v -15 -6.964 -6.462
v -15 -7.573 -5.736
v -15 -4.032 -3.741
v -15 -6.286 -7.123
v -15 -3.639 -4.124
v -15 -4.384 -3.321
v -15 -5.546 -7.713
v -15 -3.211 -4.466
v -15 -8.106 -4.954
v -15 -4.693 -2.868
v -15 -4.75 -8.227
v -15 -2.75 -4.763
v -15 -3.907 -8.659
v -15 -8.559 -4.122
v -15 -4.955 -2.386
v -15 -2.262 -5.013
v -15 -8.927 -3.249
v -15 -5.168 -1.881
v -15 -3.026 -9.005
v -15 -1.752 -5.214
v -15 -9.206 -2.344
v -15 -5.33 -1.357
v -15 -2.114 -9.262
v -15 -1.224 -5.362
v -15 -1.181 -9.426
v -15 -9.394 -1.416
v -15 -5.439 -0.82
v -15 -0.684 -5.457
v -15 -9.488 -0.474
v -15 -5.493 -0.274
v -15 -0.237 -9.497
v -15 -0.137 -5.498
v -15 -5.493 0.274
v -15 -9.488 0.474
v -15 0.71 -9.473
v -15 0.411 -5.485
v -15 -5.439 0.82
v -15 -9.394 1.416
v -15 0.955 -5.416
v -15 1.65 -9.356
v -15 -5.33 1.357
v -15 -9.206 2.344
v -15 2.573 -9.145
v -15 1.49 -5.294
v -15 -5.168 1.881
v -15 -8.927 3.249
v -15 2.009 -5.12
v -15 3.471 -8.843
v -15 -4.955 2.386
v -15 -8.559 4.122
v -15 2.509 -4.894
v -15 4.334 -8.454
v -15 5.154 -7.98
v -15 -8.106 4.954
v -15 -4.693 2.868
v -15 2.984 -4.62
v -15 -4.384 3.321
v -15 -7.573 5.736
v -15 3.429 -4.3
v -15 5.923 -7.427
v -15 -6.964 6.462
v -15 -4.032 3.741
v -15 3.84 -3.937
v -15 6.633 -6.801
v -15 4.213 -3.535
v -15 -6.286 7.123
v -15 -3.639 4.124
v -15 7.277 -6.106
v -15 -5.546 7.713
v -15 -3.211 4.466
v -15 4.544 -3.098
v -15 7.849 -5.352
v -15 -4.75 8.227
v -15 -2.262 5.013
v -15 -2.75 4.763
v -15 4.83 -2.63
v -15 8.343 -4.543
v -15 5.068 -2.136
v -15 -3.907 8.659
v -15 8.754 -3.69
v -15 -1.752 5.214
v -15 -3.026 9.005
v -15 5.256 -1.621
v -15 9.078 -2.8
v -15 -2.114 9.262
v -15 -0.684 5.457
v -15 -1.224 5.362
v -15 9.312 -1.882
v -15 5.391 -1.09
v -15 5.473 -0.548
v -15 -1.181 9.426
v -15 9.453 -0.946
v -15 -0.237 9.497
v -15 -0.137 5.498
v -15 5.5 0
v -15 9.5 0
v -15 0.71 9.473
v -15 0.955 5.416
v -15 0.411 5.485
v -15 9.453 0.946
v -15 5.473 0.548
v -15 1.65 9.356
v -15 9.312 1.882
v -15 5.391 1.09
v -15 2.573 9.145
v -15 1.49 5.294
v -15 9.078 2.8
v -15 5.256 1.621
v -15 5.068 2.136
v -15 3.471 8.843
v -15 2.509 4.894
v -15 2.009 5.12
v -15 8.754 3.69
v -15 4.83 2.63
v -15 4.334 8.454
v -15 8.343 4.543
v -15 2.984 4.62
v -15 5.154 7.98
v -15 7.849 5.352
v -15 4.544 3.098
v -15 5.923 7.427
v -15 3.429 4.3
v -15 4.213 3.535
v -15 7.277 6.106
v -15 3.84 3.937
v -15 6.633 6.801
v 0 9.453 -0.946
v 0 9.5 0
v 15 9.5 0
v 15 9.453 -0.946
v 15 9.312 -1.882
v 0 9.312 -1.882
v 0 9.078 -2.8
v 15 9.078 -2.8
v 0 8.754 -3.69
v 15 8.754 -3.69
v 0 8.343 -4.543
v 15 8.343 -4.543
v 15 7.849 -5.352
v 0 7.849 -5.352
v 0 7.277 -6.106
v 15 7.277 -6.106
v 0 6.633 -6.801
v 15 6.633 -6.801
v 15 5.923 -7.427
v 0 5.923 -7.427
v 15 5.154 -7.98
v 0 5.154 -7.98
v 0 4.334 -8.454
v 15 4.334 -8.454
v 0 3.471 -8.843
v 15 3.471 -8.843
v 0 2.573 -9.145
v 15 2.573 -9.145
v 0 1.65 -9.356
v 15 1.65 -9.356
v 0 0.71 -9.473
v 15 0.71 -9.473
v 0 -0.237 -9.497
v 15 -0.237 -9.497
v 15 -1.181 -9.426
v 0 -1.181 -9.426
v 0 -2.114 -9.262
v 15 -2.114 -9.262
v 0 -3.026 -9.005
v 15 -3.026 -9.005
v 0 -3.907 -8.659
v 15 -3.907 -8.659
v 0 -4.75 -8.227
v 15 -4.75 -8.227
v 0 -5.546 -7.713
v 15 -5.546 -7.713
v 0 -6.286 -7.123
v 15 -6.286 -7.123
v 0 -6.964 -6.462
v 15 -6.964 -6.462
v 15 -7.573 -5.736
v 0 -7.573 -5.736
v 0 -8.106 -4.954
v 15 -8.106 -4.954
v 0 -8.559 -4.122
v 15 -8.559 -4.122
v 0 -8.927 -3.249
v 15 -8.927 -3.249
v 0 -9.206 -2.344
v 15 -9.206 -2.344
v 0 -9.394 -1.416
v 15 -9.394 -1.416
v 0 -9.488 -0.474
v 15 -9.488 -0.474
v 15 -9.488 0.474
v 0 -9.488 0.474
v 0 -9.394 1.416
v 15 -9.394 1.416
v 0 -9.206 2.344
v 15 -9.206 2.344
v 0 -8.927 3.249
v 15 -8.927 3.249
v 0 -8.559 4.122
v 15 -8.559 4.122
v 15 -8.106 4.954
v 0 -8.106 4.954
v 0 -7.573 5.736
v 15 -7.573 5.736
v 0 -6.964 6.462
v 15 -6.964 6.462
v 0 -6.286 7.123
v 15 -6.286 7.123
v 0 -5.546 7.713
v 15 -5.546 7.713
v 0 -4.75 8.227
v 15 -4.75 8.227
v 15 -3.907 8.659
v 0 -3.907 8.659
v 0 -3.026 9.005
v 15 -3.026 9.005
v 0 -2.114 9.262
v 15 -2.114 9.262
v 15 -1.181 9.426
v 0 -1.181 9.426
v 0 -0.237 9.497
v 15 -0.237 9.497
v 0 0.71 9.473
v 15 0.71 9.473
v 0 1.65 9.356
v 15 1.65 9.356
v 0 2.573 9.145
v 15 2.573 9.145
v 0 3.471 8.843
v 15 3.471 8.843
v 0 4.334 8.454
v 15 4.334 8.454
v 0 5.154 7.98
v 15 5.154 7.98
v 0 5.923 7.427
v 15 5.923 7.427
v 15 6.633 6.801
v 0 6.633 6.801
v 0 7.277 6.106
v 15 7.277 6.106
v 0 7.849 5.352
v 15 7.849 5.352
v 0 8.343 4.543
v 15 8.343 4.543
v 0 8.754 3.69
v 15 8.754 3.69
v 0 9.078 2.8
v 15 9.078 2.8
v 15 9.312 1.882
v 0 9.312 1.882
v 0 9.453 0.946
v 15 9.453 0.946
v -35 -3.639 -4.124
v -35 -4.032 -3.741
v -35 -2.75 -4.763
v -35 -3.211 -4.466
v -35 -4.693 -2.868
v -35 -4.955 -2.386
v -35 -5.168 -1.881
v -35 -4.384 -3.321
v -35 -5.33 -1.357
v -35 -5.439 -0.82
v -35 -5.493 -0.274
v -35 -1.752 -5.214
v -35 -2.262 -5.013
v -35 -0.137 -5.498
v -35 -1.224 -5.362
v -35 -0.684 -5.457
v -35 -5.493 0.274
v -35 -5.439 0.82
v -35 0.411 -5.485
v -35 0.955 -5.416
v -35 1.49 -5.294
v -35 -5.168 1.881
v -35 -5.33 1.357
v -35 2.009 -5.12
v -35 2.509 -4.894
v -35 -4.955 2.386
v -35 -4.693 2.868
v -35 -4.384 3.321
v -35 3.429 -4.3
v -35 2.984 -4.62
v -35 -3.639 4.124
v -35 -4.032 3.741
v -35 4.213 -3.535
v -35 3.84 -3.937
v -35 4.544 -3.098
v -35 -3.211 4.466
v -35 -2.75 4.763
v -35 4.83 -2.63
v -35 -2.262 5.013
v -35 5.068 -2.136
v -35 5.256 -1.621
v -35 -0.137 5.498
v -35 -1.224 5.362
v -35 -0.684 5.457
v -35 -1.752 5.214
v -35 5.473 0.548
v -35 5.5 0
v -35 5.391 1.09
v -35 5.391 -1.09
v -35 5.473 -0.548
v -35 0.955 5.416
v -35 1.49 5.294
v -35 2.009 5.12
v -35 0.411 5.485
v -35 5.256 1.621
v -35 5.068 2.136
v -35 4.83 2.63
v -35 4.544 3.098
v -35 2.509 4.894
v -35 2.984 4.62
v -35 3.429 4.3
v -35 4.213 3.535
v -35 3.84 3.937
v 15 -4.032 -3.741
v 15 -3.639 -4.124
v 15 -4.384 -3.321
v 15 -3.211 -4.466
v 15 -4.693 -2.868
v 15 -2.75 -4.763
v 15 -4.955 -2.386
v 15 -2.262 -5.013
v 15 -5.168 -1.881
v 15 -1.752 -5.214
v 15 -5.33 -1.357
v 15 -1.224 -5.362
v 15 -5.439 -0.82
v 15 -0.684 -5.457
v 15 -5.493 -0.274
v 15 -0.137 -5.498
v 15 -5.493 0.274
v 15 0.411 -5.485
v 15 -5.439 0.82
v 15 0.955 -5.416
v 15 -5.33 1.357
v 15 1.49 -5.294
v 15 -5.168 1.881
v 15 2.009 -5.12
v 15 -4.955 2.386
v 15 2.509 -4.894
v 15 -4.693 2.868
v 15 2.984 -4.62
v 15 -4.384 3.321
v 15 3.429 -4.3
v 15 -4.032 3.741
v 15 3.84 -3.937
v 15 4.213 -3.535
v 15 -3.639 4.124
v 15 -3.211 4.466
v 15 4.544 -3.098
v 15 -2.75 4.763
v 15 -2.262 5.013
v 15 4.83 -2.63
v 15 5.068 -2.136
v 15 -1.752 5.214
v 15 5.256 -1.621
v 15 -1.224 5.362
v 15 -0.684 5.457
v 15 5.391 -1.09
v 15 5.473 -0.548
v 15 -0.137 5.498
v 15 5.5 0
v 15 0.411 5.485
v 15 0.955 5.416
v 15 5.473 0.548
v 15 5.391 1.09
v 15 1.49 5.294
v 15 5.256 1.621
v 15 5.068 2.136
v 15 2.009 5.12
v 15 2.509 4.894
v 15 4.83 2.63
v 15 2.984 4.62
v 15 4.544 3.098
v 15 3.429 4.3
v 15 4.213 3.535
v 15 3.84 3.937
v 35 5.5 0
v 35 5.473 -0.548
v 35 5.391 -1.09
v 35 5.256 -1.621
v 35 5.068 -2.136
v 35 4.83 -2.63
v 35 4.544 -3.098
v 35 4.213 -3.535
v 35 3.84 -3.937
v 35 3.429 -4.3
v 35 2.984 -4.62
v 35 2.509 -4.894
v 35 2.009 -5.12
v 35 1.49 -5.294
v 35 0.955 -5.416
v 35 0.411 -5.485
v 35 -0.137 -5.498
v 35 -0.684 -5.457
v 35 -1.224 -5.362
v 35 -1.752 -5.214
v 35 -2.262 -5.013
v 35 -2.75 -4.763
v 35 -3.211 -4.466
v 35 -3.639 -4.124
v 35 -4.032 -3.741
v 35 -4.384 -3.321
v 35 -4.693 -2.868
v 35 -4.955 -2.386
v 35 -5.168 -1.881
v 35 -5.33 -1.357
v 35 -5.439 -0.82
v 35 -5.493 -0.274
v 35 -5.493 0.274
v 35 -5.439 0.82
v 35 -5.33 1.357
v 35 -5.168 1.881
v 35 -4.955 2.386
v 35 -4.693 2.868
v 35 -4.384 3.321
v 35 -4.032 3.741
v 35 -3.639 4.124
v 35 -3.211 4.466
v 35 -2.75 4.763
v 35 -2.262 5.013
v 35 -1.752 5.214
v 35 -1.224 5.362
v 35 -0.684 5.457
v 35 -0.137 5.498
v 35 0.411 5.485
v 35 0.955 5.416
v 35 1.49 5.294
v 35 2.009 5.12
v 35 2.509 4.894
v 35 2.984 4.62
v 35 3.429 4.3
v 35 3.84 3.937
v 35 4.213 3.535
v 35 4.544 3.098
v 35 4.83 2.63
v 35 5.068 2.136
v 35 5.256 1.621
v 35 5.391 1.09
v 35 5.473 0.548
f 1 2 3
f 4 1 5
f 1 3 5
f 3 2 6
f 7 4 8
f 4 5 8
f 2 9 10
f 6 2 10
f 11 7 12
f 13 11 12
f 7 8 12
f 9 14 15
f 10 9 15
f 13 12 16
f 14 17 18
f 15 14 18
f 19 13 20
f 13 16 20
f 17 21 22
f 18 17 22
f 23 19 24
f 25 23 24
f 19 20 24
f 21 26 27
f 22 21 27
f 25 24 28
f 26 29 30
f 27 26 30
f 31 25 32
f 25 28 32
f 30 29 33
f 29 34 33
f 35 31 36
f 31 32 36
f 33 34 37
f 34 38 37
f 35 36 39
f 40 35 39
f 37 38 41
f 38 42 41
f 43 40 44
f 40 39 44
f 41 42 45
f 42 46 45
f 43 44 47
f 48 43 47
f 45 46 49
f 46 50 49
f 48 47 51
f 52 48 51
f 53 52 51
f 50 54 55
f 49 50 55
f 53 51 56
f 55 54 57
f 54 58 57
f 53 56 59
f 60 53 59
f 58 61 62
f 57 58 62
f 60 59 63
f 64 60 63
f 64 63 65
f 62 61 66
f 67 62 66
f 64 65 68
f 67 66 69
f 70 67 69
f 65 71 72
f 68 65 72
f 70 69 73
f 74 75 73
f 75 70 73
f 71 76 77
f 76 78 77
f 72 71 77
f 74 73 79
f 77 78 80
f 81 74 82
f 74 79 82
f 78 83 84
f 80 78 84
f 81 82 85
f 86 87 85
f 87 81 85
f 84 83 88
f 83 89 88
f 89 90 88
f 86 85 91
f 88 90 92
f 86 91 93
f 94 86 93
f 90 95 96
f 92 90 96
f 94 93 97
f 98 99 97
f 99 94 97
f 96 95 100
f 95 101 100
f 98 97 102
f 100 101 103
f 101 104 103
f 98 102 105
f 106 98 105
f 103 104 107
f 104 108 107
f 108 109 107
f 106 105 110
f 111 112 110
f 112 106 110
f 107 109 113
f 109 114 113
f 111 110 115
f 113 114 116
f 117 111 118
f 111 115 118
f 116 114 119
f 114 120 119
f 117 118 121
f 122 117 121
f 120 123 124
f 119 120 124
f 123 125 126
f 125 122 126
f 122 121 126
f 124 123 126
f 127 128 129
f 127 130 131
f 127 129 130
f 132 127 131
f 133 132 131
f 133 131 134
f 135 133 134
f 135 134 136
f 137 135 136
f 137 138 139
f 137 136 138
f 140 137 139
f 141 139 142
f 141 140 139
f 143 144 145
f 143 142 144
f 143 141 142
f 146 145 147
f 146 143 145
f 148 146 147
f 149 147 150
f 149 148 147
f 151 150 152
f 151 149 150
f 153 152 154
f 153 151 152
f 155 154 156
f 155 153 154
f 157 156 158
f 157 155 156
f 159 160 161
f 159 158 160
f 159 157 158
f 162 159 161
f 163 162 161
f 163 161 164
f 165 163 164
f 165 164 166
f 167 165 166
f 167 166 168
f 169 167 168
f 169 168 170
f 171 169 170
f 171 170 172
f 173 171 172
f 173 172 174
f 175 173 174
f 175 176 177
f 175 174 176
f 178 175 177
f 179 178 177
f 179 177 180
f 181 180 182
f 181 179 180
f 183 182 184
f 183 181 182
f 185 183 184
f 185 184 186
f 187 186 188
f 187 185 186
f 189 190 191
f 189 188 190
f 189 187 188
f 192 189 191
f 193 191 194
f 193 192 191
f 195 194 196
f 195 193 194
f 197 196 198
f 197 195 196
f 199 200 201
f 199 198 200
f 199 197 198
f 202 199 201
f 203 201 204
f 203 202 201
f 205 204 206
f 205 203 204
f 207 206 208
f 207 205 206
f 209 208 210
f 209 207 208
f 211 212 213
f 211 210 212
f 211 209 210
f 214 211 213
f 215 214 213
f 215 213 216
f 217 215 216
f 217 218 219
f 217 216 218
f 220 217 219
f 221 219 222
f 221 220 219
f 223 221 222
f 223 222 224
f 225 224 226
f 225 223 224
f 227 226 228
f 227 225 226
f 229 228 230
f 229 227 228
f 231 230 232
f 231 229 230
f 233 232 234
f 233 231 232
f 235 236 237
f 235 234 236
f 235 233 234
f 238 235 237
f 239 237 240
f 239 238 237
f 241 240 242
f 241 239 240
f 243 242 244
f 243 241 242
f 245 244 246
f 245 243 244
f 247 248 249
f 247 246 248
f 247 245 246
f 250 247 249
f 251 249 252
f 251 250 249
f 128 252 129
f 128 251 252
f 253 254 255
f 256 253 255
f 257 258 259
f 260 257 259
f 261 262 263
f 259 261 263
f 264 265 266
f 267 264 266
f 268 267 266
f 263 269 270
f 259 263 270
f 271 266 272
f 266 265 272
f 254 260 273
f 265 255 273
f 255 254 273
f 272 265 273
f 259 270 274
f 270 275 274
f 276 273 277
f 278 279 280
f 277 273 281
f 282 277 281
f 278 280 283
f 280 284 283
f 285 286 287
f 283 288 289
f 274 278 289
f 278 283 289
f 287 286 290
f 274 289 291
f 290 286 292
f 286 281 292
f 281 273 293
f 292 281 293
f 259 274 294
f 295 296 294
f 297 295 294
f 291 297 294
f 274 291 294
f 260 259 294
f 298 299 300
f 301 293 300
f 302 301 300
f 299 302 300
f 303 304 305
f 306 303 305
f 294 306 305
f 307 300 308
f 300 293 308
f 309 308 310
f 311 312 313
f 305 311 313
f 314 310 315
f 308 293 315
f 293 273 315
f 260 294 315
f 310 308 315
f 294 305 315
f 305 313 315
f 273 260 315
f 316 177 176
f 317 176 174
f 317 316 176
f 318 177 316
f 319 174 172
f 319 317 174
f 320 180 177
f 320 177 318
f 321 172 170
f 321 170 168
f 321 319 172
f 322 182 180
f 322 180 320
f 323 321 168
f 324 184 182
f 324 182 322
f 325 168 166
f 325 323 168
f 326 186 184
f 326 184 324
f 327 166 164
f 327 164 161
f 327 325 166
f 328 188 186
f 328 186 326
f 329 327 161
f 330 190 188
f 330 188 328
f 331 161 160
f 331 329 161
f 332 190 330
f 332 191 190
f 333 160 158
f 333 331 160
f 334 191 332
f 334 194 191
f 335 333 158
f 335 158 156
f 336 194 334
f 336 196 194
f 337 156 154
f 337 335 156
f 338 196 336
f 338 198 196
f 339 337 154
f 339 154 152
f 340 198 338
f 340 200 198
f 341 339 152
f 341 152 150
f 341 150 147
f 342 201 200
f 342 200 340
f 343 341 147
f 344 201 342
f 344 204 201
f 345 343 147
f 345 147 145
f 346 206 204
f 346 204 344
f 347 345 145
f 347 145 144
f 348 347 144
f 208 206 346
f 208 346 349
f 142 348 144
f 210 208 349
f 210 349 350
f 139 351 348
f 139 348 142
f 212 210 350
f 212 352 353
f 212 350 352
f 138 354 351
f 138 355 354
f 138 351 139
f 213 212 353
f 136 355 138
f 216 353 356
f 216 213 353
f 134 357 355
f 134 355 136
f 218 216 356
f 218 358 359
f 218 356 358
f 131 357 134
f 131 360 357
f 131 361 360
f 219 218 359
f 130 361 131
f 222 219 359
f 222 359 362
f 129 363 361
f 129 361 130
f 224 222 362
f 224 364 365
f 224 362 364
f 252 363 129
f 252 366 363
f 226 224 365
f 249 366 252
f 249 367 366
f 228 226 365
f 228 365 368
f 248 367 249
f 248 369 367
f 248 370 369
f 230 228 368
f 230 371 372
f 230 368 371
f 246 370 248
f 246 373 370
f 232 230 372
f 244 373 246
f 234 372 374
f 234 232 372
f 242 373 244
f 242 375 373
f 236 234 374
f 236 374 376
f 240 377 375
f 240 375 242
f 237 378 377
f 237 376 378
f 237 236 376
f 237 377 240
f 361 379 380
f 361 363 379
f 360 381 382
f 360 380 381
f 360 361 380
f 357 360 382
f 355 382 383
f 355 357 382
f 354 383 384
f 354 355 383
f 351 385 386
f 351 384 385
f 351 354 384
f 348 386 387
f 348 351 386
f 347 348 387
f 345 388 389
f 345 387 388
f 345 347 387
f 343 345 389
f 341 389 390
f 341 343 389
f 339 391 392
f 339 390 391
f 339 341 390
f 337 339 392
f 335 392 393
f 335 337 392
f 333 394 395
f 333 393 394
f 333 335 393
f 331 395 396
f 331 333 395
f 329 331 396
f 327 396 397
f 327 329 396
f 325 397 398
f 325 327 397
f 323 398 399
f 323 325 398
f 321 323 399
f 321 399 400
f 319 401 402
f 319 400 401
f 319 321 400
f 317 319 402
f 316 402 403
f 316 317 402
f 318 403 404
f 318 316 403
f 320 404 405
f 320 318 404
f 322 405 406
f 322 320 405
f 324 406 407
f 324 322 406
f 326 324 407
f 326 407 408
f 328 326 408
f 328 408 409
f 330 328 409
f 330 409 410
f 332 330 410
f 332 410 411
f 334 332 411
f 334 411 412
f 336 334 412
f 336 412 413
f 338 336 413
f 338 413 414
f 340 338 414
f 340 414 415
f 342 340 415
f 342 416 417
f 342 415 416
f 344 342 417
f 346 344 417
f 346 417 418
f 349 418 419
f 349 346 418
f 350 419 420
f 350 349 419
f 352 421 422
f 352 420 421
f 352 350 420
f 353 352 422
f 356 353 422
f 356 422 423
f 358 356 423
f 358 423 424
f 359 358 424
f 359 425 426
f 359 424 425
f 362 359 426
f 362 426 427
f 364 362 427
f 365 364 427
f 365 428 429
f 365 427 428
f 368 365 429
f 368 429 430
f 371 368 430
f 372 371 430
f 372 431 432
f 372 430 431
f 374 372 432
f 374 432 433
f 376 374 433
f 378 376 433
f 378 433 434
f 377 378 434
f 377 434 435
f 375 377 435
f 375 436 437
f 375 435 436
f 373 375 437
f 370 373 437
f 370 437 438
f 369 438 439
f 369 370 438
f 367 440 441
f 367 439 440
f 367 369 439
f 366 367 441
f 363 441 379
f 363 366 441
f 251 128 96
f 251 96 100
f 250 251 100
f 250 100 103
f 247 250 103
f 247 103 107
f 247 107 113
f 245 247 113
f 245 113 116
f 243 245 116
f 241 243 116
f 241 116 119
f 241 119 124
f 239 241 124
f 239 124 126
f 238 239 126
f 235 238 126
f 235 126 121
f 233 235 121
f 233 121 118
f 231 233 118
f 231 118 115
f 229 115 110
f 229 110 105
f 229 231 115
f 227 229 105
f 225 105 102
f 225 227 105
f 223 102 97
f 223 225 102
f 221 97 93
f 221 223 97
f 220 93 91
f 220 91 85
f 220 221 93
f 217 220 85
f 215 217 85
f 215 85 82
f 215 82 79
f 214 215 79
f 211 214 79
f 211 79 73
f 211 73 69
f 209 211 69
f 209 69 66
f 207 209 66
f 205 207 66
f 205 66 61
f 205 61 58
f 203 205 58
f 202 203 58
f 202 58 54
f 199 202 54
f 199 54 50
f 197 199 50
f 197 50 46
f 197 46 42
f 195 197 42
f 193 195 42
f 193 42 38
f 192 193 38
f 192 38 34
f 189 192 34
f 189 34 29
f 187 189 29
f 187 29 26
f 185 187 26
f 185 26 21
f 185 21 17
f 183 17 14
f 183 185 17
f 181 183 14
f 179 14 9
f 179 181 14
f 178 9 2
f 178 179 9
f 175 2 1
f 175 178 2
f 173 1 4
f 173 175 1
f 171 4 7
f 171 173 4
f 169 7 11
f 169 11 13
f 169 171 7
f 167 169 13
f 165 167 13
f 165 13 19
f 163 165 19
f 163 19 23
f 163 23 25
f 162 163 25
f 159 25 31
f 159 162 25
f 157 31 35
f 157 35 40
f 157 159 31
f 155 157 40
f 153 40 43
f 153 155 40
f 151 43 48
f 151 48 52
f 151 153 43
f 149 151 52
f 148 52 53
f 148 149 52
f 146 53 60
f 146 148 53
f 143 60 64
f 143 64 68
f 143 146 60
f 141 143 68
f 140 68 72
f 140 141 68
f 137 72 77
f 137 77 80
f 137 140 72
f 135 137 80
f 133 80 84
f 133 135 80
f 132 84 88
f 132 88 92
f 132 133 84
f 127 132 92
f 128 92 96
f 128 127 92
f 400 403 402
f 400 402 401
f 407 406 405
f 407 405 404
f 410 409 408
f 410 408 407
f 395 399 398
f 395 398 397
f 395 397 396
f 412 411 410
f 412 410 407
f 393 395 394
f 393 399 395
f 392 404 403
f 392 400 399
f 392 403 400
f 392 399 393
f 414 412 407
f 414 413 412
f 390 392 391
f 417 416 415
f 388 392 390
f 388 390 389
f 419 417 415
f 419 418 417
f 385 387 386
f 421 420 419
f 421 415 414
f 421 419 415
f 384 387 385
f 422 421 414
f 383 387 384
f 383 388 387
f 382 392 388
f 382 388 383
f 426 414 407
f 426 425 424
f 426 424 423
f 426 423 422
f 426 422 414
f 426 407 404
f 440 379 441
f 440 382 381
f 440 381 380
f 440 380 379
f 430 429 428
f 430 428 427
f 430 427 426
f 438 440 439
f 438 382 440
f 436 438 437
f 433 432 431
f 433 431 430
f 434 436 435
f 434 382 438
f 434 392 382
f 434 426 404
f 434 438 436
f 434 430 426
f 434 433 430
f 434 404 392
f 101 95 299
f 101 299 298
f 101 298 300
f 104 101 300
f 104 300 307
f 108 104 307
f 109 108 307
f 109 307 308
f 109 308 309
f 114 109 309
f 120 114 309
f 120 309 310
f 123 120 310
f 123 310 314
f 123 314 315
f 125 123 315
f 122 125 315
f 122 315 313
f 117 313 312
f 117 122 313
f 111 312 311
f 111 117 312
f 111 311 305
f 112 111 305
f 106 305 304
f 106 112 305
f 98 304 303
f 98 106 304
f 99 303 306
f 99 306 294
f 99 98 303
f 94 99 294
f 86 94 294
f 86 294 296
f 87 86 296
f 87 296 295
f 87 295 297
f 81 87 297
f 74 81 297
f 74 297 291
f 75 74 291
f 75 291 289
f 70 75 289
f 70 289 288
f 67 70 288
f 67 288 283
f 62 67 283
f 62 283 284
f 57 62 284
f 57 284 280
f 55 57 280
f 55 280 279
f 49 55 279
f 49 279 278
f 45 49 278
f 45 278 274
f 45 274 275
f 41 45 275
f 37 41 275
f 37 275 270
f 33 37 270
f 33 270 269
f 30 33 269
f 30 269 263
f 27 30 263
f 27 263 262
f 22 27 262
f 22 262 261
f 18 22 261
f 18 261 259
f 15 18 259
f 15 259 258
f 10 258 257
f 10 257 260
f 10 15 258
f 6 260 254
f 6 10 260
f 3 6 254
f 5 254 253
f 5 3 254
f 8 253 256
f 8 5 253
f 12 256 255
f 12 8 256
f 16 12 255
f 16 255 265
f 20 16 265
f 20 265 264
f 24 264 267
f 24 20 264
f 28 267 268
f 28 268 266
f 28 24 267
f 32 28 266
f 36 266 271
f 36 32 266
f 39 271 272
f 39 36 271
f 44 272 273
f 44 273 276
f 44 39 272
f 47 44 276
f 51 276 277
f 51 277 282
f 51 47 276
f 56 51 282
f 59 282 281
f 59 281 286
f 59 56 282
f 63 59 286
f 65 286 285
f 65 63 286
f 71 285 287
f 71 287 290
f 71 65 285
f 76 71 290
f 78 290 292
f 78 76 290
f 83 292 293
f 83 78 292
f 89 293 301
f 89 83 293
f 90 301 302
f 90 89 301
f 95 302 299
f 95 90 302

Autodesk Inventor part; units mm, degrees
ref_plane "YZ Plane" through (0, 0, 0) normal (1, 0, 0) x (0, 1, 0)
ref_plane "XZ Plane" through (0, 0, 0) normal (0, 1, 0) x (-1, 0, 0)
ref_plane "XY Plane" through (0, 0, 0) normal (0, 0, 1) x (1, 0, 0)
sketch "Boceto1" plane through (0, 0, 0) normal (1, 0, 0) x (0, 1, 0)
  circle A0 centre (0, 0) radius 9.5
  circle A1 centre (0, 0) radius 5.5
  dimension "d0" = 19
  dimension "d1" = 11
extrude "Extrusión1" add sketch "Boceto1" along normal mid plane 70 contours A1
extrude "Extrusión2" add sketch "Boceto1" along normal mid plane 30
properties part number "Bracket polea"
